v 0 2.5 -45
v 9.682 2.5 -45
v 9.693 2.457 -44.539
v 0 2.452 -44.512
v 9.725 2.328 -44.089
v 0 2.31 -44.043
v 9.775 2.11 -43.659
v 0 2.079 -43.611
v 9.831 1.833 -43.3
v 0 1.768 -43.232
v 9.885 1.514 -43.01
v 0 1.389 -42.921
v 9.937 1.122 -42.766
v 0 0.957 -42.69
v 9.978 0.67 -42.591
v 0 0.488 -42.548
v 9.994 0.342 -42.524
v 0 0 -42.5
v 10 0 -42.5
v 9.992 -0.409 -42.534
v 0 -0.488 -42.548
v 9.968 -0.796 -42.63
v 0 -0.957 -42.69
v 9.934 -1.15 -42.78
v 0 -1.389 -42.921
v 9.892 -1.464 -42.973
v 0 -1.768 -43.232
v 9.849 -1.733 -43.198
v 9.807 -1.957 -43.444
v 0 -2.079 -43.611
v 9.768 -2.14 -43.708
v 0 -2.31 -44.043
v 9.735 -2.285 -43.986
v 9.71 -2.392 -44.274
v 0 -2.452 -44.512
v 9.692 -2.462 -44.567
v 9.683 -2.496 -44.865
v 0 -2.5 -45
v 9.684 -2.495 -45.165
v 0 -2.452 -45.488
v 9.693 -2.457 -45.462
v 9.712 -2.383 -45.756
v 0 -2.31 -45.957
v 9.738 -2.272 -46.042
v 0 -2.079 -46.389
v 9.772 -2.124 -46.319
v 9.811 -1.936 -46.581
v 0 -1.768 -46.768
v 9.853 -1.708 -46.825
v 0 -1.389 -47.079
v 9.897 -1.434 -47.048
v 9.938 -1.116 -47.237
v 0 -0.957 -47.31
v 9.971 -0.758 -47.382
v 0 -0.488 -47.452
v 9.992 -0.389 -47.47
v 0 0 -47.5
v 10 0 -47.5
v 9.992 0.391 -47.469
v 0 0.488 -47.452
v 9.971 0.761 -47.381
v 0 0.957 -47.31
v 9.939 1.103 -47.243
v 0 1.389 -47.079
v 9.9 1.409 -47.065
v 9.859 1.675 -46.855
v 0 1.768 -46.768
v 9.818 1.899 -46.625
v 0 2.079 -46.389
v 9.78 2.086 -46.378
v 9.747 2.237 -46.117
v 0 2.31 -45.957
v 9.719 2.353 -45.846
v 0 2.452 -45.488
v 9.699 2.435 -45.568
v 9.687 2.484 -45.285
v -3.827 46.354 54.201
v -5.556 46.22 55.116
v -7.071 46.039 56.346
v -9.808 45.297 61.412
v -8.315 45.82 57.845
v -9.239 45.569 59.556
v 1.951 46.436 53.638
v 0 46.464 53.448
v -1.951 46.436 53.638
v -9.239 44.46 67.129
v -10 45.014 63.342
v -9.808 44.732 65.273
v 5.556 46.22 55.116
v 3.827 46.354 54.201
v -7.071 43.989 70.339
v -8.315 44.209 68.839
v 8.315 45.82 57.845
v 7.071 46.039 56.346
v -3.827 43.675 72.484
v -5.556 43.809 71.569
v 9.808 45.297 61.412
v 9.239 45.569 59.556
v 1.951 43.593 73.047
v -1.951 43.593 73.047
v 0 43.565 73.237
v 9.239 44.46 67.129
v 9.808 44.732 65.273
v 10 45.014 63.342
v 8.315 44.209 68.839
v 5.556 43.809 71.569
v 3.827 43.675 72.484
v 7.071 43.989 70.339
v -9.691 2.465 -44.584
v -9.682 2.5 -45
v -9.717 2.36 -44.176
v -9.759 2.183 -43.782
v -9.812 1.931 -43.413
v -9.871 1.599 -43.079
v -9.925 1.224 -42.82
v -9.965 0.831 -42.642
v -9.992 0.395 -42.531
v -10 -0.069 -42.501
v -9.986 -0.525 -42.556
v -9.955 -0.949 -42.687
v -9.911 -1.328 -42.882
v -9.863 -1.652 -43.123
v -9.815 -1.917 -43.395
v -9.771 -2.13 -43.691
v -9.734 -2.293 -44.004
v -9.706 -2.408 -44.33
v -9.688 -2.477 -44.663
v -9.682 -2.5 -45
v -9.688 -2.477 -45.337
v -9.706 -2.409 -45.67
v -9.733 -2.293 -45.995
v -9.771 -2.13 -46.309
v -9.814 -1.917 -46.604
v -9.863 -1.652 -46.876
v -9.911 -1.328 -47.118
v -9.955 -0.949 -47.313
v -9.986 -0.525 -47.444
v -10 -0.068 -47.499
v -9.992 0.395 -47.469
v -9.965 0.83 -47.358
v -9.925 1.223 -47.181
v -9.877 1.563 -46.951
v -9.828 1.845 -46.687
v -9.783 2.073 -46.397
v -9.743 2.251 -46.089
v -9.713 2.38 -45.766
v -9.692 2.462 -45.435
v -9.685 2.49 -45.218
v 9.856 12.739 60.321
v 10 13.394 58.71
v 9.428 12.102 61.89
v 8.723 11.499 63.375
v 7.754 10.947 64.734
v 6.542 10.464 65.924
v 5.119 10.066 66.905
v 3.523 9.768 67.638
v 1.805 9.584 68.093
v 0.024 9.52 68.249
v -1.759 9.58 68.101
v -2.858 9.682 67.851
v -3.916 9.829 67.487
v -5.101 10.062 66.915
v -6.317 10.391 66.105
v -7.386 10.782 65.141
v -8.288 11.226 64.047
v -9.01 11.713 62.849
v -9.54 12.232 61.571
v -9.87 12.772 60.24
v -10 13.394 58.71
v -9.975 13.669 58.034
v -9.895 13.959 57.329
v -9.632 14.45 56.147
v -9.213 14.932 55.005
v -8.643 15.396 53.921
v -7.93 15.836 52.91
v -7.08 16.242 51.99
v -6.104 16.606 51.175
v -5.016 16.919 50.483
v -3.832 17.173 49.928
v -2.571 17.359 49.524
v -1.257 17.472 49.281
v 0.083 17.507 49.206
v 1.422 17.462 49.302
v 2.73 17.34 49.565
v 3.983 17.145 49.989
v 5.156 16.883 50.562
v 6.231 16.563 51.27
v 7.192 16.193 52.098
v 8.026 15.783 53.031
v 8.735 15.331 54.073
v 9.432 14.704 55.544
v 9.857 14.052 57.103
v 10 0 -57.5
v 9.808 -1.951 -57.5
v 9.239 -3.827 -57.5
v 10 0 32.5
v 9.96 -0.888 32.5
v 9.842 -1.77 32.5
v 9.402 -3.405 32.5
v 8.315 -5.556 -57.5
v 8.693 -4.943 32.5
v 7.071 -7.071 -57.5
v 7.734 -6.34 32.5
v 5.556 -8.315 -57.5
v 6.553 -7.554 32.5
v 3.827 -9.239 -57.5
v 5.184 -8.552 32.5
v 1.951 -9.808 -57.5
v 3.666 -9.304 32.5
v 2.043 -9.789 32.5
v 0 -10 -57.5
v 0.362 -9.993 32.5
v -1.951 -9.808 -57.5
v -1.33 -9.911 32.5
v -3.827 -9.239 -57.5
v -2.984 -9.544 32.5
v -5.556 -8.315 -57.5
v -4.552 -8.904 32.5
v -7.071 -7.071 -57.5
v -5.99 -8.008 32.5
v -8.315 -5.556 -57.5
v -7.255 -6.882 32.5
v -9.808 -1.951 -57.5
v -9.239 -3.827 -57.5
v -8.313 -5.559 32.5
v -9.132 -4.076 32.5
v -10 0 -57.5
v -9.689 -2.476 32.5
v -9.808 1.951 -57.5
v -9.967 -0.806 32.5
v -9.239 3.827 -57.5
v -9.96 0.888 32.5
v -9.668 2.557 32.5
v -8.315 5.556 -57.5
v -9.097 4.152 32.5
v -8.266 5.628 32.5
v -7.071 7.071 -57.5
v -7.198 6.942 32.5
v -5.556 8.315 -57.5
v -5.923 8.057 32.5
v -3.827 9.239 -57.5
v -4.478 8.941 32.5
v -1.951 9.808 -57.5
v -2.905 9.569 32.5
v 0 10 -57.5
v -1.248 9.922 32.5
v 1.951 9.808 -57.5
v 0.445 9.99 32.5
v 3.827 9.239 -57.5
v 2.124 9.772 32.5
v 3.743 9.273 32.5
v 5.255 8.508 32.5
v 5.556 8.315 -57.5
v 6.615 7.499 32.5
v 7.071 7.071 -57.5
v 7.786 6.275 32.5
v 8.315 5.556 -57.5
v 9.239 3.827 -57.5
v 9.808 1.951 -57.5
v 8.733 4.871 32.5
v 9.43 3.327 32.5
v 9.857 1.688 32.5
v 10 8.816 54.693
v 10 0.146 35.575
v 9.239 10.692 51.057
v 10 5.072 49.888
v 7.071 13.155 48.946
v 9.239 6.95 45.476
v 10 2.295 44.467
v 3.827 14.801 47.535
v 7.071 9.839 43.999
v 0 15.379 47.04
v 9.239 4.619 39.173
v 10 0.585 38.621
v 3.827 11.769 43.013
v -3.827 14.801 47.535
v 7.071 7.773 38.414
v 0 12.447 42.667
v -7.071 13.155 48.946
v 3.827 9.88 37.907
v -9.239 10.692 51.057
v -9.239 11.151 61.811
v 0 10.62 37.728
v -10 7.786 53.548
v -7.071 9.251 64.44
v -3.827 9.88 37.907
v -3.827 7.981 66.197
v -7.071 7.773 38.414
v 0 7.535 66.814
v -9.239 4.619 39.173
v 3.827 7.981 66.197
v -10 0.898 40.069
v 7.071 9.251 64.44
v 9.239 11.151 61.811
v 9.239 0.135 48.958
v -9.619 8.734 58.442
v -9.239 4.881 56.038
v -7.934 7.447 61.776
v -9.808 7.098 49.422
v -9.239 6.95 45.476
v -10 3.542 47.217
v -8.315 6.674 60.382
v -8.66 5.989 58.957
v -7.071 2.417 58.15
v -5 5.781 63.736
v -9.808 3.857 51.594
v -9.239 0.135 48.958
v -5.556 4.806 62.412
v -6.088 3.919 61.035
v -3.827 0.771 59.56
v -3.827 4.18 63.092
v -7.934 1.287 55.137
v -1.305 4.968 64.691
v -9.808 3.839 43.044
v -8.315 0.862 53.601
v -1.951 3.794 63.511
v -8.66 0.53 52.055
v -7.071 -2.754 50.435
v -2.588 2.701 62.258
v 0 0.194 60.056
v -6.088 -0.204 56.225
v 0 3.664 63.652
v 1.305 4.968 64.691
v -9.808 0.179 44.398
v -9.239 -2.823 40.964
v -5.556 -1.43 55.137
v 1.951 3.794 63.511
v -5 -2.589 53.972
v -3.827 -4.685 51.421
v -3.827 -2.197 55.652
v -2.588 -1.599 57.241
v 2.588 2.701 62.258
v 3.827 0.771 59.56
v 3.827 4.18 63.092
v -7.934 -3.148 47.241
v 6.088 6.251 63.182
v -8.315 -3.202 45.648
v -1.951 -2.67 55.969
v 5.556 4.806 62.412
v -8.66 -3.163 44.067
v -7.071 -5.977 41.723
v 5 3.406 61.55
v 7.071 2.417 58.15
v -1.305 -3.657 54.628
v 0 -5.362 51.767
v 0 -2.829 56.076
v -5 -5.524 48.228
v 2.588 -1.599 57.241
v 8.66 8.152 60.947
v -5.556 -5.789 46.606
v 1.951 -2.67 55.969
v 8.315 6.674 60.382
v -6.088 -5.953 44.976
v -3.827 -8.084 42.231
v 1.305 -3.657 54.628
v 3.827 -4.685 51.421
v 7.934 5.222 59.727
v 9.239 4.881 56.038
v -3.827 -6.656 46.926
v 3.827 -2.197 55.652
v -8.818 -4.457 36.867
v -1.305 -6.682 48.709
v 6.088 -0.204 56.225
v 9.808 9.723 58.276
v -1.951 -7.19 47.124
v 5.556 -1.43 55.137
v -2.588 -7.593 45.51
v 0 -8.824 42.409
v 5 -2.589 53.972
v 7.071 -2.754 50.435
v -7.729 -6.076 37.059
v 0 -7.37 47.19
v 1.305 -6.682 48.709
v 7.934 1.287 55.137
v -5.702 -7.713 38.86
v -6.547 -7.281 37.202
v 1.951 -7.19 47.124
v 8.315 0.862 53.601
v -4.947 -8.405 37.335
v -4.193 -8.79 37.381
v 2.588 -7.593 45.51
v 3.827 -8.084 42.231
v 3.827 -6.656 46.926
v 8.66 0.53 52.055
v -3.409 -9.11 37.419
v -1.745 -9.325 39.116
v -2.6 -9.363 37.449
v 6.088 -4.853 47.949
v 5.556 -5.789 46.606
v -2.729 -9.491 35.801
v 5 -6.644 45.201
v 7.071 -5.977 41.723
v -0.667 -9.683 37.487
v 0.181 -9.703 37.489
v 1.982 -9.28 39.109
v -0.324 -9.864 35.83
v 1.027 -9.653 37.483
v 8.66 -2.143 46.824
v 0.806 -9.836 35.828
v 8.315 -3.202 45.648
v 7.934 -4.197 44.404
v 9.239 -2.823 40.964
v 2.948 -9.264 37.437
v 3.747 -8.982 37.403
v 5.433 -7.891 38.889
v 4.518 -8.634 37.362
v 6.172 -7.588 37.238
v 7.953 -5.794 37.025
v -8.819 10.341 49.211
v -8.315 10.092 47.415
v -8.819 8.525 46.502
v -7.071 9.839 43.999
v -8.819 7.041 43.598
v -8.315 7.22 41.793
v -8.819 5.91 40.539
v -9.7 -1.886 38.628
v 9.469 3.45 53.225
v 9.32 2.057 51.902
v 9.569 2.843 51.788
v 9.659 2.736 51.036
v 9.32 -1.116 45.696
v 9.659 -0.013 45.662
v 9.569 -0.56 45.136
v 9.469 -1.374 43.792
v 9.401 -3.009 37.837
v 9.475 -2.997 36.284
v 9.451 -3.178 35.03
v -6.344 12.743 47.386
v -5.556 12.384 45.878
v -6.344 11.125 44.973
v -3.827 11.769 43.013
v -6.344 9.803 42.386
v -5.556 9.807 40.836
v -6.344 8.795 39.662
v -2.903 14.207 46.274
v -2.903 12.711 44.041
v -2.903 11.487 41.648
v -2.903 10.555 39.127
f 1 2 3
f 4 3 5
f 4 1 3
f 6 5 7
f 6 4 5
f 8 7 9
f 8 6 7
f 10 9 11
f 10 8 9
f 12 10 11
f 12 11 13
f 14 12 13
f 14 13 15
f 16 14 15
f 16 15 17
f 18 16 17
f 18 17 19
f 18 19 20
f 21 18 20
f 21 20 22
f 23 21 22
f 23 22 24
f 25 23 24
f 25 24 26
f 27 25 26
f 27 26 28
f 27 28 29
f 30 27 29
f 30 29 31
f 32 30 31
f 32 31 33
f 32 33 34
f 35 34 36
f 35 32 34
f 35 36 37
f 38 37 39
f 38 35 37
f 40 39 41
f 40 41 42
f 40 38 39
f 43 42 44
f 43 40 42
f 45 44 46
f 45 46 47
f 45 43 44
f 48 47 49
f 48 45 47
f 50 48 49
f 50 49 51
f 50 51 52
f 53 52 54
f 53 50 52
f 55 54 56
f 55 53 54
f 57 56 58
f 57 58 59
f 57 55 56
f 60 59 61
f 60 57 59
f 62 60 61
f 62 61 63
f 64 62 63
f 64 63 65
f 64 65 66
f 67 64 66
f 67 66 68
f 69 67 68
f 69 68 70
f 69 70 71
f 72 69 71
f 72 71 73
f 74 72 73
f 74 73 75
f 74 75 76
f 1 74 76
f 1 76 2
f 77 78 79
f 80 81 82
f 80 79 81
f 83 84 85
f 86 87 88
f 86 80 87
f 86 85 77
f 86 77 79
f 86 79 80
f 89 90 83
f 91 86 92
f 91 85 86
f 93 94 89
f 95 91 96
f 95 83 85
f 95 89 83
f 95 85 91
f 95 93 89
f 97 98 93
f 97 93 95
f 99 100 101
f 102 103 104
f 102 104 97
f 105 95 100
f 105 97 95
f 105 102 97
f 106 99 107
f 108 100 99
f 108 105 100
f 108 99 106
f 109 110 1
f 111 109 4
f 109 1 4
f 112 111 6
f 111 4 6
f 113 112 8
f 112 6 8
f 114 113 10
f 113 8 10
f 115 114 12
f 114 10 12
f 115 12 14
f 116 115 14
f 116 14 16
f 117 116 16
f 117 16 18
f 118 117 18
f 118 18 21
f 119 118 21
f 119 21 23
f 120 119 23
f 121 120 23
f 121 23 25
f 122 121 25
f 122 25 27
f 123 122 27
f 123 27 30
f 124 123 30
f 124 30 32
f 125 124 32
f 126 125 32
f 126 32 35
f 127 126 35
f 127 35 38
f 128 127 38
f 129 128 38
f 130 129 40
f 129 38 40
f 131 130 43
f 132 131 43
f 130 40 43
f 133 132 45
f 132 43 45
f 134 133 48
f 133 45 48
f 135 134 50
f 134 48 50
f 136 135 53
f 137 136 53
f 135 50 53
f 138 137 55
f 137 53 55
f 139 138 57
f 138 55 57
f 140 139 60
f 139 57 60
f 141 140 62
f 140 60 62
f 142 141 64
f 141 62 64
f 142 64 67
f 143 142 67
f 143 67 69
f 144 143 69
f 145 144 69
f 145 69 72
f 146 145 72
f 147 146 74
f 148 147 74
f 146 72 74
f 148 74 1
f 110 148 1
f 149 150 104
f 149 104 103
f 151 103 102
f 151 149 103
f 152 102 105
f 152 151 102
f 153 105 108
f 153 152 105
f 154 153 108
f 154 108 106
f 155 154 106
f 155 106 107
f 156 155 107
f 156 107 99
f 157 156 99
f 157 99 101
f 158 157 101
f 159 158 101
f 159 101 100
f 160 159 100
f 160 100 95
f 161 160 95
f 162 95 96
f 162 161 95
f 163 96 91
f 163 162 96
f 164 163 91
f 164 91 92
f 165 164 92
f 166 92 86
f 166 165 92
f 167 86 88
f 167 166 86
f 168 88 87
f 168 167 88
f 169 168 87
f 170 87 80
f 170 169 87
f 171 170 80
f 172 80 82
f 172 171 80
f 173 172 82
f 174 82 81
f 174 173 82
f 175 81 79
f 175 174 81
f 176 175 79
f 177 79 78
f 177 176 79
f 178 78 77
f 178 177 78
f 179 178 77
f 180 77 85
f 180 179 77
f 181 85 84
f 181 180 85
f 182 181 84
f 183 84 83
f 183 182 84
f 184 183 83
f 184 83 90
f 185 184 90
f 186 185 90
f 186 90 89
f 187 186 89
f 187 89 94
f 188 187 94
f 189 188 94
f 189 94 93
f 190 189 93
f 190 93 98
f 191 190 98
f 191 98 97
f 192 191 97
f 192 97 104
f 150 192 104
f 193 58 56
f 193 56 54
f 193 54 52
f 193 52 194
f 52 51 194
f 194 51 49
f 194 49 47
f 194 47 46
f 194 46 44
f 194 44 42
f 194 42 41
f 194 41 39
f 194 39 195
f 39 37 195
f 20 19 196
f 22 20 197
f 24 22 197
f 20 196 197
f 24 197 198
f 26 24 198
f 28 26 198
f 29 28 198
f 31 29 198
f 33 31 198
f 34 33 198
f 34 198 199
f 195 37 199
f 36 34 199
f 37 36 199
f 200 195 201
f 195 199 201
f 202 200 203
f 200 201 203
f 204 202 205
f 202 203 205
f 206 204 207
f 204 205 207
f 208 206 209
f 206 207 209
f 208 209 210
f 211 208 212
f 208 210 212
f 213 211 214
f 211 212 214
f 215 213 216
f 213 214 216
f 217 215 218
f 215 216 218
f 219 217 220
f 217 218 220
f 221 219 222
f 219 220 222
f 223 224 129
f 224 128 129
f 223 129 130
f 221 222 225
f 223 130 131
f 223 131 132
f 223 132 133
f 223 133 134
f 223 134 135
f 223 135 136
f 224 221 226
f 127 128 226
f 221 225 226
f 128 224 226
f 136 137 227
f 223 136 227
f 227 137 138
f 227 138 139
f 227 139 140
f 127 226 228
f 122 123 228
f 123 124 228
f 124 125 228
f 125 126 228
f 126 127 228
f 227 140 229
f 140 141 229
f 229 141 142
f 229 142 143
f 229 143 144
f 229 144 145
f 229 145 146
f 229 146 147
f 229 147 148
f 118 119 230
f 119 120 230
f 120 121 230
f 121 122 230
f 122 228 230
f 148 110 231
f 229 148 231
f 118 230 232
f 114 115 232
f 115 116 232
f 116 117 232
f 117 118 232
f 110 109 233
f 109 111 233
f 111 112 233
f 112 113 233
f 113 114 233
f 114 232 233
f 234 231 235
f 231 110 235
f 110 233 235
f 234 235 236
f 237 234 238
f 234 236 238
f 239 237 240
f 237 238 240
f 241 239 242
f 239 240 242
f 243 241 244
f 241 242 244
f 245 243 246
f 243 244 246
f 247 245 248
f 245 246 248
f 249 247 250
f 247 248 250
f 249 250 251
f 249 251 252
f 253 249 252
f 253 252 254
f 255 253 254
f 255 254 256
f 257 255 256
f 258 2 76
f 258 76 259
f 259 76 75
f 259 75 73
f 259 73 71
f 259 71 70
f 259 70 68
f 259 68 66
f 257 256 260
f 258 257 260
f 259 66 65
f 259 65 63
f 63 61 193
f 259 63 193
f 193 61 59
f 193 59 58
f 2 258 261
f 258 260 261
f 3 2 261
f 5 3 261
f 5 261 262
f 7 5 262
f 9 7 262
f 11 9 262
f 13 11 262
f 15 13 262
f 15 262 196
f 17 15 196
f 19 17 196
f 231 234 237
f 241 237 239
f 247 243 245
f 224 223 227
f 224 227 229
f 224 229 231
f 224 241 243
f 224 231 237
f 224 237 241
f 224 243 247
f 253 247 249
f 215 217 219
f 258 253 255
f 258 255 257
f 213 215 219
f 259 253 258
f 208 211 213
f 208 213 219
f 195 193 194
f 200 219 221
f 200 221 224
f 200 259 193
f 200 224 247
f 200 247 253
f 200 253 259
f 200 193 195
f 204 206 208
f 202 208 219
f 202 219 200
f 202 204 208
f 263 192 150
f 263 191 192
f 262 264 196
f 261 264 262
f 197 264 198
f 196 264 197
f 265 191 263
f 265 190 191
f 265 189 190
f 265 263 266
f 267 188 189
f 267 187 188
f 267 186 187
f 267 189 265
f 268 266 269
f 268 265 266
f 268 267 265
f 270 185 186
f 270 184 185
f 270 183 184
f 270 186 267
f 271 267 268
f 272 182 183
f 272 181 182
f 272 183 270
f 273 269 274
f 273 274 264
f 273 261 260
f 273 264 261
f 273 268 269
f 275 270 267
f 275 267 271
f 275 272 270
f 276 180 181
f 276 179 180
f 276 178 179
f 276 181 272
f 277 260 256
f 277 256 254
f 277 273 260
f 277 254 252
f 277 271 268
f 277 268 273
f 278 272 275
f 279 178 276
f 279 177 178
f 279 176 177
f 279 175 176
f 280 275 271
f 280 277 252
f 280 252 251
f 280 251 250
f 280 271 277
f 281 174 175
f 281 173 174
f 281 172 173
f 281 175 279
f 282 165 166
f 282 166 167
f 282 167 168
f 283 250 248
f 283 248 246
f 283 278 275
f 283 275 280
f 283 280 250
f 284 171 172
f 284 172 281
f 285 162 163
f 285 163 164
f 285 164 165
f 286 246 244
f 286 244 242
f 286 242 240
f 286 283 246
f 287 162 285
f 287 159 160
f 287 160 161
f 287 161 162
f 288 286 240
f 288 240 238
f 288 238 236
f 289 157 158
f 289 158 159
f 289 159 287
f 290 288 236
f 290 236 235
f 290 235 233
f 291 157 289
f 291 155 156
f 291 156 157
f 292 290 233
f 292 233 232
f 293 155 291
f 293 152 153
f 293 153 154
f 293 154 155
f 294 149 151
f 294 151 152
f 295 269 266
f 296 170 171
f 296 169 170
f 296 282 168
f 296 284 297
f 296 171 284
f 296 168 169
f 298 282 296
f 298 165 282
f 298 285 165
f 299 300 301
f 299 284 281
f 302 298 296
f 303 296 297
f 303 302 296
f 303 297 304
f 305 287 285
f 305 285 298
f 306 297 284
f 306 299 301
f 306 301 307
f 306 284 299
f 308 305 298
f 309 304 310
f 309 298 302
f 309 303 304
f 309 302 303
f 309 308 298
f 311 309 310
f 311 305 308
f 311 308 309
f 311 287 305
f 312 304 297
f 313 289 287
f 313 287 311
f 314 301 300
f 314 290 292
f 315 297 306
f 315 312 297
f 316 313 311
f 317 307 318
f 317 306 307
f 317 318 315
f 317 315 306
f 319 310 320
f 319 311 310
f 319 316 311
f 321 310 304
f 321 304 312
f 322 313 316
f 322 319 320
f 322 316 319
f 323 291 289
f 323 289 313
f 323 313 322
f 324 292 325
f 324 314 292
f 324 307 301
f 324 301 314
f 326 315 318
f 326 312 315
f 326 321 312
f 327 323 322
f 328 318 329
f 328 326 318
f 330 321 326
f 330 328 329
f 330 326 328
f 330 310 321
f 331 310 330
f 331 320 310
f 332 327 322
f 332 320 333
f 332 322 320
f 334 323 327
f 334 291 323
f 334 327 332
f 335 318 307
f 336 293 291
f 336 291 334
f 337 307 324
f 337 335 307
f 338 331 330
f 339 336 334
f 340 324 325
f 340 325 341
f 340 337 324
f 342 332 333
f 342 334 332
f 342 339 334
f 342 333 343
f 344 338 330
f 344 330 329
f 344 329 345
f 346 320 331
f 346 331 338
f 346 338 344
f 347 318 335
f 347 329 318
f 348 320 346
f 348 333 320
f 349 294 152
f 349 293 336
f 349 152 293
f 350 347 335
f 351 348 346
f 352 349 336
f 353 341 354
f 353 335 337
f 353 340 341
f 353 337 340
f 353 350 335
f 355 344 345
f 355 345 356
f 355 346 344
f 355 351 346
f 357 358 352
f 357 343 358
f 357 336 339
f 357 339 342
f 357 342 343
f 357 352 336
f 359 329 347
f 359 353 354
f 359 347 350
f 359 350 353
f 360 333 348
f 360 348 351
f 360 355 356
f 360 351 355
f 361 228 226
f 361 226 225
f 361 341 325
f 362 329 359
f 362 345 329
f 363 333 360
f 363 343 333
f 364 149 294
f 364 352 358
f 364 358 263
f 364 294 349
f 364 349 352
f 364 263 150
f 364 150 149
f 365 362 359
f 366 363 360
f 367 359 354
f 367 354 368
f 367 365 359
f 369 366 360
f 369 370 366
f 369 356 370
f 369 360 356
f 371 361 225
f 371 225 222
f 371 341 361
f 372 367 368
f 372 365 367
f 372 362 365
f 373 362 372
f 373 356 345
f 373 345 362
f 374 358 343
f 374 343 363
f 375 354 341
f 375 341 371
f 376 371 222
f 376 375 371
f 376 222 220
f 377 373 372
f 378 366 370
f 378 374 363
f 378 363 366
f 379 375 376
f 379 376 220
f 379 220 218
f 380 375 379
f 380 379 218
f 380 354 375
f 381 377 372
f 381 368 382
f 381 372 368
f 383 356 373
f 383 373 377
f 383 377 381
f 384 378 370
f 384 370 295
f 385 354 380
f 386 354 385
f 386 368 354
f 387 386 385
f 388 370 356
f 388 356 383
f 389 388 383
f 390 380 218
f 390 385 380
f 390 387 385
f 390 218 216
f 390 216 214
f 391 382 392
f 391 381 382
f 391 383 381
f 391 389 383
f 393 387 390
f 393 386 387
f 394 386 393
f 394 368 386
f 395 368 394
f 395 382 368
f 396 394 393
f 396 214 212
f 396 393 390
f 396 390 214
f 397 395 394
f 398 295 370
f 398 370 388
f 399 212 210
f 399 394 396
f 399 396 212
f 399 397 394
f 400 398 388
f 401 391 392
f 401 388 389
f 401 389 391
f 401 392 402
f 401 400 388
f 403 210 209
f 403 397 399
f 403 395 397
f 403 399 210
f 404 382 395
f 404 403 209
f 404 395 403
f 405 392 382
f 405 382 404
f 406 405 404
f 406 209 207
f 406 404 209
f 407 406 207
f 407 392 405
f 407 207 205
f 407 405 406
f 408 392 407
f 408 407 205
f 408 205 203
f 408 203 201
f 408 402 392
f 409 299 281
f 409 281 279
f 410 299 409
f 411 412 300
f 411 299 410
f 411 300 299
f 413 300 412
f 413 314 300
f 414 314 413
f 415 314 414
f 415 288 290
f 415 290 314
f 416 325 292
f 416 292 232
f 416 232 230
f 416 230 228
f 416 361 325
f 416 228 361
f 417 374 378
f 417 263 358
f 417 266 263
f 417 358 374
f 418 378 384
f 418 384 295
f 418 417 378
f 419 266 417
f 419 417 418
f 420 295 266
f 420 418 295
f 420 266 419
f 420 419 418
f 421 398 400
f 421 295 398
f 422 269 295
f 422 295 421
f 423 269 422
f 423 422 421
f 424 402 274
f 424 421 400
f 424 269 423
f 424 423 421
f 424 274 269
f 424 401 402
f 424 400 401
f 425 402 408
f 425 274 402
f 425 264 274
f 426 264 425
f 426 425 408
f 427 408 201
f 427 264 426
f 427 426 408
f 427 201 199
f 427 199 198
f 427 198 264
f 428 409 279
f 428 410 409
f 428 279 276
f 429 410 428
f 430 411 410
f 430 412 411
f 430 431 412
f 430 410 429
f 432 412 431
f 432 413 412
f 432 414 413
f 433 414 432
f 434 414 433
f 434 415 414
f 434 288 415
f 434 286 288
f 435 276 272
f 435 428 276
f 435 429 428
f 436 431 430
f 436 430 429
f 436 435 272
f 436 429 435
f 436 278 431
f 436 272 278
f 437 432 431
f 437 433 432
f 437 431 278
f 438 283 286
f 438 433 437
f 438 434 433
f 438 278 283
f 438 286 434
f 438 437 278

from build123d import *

# Parameters (mm, degrees)
F0_R     = 10
F3_R     = 10
F4_DEPTH = 25
F5_R     = 2.5
F6_DEPTH = 25
F7_DEPTH = 25


with BuildPart() as f2:
    # F2: sweep along a path in F1
    with BuildLine(Plane.YZ) as f2_path:
        Line((45.0143888593, 63.3423924446), (13.3935455233, 58.710038662))
        ThreePointArc((13.3935455233, 58.710038662), (3.5423817202, 47.2169391208), (0, 32.5))
        Line((0, 32.5), (0, 0))
        Line((0, 0), (0, -32.5))
    # F0 (on Top) → F2 (sweep)
    with BuildSketch(Plane.XY):
        Circle(F0_R)
    sweep(path=f2_path.line, transition=Transition.RIGHT)

    # F3 (on face) → F4 (join)
    with BuildSketch(Plane(origin=(0, 0, -32.5), x_dir=(1, 0, 0), z_dir=(0, 0, -1))):
        Circle(F3_R)
    extrude(amount=F4_DEPTH)

    # F5 (on Right) → F6 (cut)
    with BuildSketch(Plane.YZ):
        with Locations((0, -45)):
            Circle(F5_R)
    extrude(amount=-F6_DEPTH, mode=Mode.SUBTRACT)

    # F7 (cut): a face of the model
    f7_faces = [f2.faces().sort_by_distance(p)[0] for p in [
        (0, 0, -45),
    ]]
    extrude(f7_faces, amount=-F7_DEPTH, mode=Mode.SUBTRACT)


solid = f2.part
